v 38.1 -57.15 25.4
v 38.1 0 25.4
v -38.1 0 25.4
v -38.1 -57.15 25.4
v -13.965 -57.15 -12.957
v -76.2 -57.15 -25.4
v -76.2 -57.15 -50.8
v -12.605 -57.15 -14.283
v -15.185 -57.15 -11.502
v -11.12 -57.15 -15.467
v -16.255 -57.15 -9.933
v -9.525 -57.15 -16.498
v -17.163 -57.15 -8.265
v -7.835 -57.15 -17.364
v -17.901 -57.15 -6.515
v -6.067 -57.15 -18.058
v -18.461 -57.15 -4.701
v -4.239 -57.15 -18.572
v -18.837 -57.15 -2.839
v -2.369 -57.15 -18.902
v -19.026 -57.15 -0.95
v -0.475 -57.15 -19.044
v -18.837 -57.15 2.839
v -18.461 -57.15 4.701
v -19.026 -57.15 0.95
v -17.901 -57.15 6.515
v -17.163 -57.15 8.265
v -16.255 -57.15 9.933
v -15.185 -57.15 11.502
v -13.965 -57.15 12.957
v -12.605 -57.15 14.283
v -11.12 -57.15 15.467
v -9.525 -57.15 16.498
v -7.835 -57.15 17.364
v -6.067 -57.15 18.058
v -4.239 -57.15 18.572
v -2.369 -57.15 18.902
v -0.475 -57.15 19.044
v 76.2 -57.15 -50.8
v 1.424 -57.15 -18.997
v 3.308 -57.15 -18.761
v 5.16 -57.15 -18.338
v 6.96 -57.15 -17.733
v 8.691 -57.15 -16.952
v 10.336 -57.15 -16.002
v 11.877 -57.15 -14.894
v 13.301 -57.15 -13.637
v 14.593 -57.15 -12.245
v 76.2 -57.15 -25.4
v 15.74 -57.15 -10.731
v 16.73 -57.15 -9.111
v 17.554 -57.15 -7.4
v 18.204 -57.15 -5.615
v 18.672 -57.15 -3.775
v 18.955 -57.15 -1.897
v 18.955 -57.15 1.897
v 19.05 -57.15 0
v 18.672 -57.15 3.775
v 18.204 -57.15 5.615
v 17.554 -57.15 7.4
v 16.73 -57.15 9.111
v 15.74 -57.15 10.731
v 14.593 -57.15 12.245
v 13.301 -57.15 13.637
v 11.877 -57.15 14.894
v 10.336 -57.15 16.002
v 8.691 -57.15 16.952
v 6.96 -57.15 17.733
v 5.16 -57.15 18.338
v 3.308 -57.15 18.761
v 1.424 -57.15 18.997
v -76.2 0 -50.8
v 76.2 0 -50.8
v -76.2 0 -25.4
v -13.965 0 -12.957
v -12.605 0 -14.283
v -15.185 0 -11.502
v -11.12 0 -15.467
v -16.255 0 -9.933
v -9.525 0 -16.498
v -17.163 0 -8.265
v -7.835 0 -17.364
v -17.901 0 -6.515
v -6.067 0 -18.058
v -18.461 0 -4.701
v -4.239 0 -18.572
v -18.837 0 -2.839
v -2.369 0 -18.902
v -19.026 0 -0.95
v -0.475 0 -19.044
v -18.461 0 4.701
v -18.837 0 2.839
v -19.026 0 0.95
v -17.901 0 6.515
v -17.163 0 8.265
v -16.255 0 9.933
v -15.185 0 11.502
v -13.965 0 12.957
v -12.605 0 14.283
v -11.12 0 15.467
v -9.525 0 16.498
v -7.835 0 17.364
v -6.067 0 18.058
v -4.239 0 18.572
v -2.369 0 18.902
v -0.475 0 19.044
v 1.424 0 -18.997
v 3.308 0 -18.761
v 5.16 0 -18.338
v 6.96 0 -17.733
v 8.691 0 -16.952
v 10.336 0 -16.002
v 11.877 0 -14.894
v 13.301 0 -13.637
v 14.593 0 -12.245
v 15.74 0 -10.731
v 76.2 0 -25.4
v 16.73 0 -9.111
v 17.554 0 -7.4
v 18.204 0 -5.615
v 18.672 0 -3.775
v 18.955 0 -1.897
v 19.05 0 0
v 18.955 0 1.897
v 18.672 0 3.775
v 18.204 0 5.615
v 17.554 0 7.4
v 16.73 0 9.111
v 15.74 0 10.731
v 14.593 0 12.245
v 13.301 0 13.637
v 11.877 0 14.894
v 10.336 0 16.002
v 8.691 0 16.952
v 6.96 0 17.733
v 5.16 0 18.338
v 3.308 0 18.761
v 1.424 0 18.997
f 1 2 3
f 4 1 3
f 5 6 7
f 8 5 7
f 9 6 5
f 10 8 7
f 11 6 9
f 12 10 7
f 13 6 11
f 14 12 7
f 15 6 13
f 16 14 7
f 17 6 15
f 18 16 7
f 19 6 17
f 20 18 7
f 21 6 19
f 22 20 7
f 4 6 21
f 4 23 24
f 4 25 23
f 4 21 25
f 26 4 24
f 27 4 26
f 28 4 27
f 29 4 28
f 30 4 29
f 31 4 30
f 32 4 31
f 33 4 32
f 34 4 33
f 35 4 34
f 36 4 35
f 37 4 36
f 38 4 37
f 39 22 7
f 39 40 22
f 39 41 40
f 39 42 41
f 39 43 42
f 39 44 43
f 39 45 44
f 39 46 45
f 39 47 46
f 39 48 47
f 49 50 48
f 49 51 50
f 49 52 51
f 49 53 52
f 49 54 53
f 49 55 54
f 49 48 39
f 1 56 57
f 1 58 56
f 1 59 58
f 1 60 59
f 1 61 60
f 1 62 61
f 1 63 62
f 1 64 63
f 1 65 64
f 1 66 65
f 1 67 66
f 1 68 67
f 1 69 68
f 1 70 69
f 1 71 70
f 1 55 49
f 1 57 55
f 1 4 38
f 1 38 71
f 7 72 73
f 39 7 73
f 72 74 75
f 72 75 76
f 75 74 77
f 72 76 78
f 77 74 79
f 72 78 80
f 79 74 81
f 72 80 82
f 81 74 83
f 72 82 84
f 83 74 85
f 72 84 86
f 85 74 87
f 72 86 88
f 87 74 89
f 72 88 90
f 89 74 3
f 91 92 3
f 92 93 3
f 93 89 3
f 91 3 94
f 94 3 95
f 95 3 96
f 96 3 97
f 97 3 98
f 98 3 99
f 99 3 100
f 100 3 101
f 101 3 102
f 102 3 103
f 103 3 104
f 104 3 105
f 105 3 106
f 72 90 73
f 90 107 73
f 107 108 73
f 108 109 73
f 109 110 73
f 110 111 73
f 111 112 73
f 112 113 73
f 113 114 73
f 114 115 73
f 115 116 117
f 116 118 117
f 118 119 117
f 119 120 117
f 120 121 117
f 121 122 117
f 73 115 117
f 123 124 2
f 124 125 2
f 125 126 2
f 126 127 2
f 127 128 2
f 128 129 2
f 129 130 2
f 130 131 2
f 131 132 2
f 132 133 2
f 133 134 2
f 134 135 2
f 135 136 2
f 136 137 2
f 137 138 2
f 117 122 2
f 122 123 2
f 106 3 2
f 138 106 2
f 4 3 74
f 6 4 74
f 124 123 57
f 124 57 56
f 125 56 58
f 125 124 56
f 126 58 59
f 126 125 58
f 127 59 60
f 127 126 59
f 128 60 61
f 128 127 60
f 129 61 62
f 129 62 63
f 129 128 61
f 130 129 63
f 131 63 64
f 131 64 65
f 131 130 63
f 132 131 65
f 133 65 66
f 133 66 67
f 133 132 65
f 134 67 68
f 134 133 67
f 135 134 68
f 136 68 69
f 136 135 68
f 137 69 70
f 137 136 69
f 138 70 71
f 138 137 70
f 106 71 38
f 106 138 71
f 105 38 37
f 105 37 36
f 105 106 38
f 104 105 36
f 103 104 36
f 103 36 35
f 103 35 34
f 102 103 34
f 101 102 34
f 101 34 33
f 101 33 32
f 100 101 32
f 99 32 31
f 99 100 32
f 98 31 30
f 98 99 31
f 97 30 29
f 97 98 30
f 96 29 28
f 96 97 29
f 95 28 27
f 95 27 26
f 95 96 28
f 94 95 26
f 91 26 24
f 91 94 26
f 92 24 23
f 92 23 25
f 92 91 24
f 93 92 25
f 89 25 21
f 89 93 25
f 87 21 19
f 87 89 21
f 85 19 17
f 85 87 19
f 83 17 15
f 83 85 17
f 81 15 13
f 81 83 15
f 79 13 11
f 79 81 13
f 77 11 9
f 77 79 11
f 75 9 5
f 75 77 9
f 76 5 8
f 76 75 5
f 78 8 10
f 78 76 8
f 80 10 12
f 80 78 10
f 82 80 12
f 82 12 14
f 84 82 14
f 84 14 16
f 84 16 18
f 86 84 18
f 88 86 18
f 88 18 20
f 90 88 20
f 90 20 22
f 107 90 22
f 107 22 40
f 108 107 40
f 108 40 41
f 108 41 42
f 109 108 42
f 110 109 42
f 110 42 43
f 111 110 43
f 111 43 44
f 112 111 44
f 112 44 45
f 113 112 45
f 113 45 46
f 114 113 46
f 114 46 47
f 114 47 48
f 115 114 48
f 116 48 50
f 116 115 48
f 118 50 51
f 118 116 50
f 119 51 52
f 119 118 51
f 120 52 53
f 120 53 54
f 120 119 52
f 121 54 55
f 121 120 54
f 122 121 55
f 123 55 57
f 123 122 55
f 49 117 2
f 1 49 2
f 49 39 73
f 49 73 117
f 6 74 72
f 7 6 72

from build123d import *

# Parameters (mm, degrees)
F0_R     = 19.05
F1_DEPTH = 57.15


with BuildPart() as f1:
    # F0 (on Front) → F1 (new body)
    with BuildSketch(Plane.XZ):
        Polygon((-76.2, -25.4), (-76.2, -50.8), (76.2, -50.8), (76.2, -25.4), (38.1, 25.4), (0, 25.4), (-38.1, 25.4), align=None)
        Circle(F0_R, mode=Mode.SUBTRACT)
    extrude(amount=F1_DEPTH)


solid = f1.part
